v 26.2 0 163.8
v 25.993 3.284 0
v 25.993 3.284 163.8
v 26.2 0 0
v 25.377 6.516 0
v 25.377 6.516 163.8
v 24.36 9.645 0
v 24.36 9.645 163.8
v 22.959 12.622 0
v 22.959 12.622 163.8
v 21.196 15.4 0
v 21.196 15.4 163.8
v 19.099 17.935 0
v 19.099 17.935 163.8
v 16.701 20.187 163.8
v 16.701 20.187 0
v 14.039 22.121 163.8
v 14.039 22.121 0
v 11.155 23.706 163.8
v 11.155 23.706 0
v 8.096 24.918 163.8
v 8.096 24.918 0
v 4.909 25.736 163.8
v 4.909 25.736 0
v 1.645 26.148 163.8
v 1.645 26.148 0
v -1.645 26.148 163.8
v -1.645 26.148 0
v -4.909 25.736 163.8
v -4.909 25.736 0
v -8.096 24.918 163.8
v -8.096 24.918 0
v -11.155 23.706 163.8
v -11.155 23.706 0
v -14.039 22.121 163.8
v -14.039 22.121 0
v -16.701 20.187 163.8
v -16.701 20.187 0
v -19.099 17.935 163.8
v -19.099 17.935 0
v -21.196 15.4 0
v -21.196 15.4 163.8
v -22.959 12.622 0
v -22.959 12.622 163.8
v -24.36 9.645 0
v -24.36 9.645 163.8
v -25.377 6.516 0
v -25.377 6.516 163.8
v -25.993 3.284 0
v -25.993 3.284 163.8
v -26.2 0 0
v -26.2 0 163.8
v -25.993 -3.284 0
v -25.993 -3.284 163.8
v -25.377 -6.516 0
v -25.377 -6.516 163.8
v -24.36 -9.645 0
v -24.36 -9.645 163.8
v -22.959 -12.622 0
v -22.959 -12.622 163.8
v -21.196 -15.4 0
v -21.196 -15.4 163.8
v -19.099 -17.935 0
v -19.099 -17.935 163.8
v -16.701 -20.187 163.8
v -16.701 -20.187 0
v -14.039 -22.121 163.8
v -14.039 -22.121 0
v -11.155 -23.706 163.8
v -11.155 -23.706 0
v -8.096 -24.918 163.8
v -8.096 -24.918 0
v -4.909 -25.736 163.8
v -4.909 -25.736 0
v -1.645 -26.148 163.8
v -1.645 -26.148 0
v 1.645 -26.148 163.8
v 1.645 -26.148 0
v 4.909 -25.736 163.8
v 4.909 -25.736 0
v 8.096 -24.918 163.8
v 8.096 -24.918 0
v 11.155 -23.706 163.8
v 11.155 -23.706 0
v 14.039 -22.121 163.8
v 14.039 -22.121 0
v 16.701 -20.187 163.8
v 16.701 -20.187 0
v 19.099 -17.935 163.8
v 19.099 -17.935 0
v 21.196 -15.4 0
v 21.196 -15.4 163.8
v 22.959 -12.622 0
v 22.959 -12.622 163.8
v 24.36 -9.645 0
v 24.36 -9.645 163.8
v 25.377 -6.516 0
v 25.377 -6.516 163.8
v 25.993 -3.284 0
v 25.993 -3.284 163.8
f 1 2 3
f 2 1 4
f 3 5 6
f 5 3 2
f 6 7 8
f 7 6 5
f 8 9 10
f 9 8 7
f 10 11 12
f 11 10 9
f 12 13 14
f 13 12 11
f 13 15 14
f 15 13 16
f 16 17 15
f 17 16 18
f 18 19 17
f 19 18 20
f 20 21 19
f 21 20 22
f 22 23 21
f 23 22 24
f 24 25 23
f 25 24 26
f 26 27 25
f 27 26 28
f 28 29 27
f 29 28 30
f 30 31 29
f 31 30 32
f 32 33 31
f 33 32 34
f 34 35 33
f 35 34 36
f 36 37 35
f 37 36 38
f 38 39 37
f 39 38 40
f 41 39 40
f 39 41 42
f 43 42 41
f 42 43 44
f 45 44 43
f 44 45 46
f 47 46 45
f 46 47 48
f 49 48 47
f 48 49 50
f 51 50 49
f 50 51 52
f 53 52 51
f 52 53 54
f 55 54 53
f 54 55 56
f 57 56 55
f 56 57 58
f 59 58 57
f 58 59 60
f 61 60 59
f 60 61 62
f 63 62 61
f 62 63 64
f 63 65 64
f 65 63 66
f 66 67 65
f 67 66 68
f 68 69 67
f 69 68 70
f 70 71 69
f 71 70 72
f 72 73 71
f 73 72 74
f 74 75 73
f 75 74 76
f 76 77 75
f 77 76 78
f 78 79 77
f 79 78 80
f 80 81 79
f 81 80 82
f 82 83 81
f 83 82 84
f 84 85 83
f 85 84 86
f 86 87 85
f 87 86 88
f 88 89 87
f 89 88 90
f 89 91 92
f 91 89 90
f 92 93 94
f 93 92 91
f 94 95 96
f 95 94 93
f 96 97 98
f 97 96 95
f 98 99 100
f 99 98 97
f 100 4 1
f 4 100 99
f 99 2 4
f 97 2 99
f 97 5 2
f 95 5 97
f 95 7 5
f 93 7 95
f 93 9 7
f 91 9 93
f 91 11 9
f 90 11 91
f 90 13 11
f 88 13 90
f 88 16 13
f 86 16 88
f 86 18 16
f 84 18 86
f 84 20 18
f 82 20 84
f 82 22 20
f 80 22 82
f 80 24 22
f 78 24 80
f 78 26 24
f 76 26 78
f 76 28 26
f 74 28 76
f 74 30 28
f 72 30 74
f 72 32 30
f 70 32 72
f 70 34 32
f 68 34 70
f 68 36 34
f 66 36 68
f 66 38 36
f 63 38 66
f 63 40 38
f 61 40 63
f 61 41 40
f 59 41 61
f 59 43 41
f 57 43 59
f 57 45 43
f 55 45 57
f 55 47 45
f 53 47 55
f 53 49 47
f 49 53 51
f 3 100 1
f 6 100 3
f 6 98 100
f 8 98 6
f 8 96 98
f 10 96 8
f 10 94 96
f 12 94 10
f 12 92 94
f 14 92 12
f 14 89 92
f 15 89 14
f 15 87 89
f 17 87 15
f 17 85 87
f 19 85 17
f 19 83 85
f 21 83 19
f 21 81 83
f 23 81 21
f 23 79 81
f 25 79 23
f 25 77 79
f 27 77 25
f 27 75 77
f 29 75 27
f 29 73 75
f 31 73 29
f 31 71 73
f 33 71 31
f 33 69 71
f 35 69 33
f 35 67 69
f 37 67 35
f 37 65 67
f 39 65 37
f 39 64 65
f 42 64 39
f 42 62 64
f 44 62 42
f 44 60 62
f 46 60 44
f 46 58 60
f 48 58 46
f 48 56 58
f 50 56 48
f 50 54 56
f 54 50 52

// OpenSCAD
// file: global_parameters.scad
radius = 50 / 2;
clear = 0.175;

wall = 1.2;
rib_wall = 0.6;

connection_lenght = radius*2;

resolution = 50;
// file: library.scad
module ring(radius, width, height) {
	difference () {
		cylinder(r = radius, h = height);
		translate([0, 0, -1])
		cylinder(r = radius - width, h = height + 2);
	}
}


module ccube(width, depth, height, z_center = false) {
	if (z_center) {
		translate([-width / 2, -depth / 2, -height / 2])
		cube([width, depth, height]);
	} else {
		translate([-width / 2, -depth / 2, 0])
		cube([width, depth, height]);
	}
}

module twisted_ribs(outer_r, inner_r, height, twist, count, wall) {
	angle = 360 / count;
	linear_extrude(height, twist = twist, slices = 20) {
		for (i = [0 : (count - 1)]) {
			rotate([0, 0, i * angle])
			translate([0, inner_r])
			square([wall, outer_r - inner_r]);
		}
	}
}

ccube(100, 100, 10);
ring(50, 5, 20);
ring(50, 2, 30);
// main file
use <library.scad>
include <global_parameters.scad>

inner_radius = radius - 5;
height = 185;
motor_top = 173;
motor_bottom = 10;

rib_count = 18;

cone_height = 100;
cone_connection_height = 20;


//////////
//
//      Rocket nose cone
//
/////////

/*translate([0, 0, 100 ])   // separate nose from the hull


translate([0, 0, height - cone_connection_height ])   // move cone to the top of the rocket.
union () {
    translate([0, 0, cone_connection_height ])   // move cone to the top of the rocket.
    ogive_nose_cone(radius, cone_height, resolution, wall);

    difference () {                 // bottom connection part  of the hull shell. 
        cylinder(r = radius, h = cone_connection_height , $fn=resolution);
        cylinder(r = radius - wall, h = cone_connection_height, $fn=resolution);
    }    
}

*/

//////////
//
//      Rocket hull of the nose connection section
//
/////////

/*
difference () {                 // bottom connection part  of the hull shell. 
    cylinder(r = radius, h = connection_lenght , $fn=resolution);
    cylinder(r = radius - rib_wall, h = connection_lenght, $fn=resolution);
}

translate([0, 0, connection_lenght - clear ]){   // remove ribs to place stage connection section
    difference () {                 // hull shell
        cylinder(r = radius, h = height - connection_lenght - cone_connection_height, $fn=resolution);
        cylinder(r = radius - rib_wall, h = height - connection_lenght - cone_connection_height, $fn=resolution);
    }

    difference () {
            union () {
                    twisted_ribs( radius - (wall / 2), inner_radius, height-connection_lenght - cone_connection_height,
                    90, rib_count, rib_wall);
            }
            
            cylinder(r1 = radius - wall, r2 = inner_radius, h = 15 ); // bevel inner ribs for better printing.
            
    // connection to the cone remove ribs
            translate([0, 0, height - connection_lenght - cone_connection_height])   // remove ribs to place stage connection section
            difference () {                
                    cylinder(r = radius, h = cone_connection_height , $fn=resolution);
                    cylinder(r = radius-1.5*wall, h = cone_connection_height, $fn=resolution);
            }
    }
}

// hull of the connection part. 
translate([0, 0, height - cone_connection_height])
difference () {                 // hull shell of connection part.
        cylinder(r = radius - wall - 2*clear, h = cone_connection_height , $fn=resolution);
        cylinder(r = radius - 2*wall - 2*clear, h = cone_connection_height, $fn=resolution);
}

// partition for parashute explosive charge.
translate([0, 0, height - cone_connection_height - wall])        
cylinder(r = radius, h = 2*wall, $fn=resolution );
*/



// object modifier
//translate([0, 0, height - cone_connection_height - wall])
cylinder(r = radius + wall, h = height - cone_connection_height - wall, $fn=resolution);
